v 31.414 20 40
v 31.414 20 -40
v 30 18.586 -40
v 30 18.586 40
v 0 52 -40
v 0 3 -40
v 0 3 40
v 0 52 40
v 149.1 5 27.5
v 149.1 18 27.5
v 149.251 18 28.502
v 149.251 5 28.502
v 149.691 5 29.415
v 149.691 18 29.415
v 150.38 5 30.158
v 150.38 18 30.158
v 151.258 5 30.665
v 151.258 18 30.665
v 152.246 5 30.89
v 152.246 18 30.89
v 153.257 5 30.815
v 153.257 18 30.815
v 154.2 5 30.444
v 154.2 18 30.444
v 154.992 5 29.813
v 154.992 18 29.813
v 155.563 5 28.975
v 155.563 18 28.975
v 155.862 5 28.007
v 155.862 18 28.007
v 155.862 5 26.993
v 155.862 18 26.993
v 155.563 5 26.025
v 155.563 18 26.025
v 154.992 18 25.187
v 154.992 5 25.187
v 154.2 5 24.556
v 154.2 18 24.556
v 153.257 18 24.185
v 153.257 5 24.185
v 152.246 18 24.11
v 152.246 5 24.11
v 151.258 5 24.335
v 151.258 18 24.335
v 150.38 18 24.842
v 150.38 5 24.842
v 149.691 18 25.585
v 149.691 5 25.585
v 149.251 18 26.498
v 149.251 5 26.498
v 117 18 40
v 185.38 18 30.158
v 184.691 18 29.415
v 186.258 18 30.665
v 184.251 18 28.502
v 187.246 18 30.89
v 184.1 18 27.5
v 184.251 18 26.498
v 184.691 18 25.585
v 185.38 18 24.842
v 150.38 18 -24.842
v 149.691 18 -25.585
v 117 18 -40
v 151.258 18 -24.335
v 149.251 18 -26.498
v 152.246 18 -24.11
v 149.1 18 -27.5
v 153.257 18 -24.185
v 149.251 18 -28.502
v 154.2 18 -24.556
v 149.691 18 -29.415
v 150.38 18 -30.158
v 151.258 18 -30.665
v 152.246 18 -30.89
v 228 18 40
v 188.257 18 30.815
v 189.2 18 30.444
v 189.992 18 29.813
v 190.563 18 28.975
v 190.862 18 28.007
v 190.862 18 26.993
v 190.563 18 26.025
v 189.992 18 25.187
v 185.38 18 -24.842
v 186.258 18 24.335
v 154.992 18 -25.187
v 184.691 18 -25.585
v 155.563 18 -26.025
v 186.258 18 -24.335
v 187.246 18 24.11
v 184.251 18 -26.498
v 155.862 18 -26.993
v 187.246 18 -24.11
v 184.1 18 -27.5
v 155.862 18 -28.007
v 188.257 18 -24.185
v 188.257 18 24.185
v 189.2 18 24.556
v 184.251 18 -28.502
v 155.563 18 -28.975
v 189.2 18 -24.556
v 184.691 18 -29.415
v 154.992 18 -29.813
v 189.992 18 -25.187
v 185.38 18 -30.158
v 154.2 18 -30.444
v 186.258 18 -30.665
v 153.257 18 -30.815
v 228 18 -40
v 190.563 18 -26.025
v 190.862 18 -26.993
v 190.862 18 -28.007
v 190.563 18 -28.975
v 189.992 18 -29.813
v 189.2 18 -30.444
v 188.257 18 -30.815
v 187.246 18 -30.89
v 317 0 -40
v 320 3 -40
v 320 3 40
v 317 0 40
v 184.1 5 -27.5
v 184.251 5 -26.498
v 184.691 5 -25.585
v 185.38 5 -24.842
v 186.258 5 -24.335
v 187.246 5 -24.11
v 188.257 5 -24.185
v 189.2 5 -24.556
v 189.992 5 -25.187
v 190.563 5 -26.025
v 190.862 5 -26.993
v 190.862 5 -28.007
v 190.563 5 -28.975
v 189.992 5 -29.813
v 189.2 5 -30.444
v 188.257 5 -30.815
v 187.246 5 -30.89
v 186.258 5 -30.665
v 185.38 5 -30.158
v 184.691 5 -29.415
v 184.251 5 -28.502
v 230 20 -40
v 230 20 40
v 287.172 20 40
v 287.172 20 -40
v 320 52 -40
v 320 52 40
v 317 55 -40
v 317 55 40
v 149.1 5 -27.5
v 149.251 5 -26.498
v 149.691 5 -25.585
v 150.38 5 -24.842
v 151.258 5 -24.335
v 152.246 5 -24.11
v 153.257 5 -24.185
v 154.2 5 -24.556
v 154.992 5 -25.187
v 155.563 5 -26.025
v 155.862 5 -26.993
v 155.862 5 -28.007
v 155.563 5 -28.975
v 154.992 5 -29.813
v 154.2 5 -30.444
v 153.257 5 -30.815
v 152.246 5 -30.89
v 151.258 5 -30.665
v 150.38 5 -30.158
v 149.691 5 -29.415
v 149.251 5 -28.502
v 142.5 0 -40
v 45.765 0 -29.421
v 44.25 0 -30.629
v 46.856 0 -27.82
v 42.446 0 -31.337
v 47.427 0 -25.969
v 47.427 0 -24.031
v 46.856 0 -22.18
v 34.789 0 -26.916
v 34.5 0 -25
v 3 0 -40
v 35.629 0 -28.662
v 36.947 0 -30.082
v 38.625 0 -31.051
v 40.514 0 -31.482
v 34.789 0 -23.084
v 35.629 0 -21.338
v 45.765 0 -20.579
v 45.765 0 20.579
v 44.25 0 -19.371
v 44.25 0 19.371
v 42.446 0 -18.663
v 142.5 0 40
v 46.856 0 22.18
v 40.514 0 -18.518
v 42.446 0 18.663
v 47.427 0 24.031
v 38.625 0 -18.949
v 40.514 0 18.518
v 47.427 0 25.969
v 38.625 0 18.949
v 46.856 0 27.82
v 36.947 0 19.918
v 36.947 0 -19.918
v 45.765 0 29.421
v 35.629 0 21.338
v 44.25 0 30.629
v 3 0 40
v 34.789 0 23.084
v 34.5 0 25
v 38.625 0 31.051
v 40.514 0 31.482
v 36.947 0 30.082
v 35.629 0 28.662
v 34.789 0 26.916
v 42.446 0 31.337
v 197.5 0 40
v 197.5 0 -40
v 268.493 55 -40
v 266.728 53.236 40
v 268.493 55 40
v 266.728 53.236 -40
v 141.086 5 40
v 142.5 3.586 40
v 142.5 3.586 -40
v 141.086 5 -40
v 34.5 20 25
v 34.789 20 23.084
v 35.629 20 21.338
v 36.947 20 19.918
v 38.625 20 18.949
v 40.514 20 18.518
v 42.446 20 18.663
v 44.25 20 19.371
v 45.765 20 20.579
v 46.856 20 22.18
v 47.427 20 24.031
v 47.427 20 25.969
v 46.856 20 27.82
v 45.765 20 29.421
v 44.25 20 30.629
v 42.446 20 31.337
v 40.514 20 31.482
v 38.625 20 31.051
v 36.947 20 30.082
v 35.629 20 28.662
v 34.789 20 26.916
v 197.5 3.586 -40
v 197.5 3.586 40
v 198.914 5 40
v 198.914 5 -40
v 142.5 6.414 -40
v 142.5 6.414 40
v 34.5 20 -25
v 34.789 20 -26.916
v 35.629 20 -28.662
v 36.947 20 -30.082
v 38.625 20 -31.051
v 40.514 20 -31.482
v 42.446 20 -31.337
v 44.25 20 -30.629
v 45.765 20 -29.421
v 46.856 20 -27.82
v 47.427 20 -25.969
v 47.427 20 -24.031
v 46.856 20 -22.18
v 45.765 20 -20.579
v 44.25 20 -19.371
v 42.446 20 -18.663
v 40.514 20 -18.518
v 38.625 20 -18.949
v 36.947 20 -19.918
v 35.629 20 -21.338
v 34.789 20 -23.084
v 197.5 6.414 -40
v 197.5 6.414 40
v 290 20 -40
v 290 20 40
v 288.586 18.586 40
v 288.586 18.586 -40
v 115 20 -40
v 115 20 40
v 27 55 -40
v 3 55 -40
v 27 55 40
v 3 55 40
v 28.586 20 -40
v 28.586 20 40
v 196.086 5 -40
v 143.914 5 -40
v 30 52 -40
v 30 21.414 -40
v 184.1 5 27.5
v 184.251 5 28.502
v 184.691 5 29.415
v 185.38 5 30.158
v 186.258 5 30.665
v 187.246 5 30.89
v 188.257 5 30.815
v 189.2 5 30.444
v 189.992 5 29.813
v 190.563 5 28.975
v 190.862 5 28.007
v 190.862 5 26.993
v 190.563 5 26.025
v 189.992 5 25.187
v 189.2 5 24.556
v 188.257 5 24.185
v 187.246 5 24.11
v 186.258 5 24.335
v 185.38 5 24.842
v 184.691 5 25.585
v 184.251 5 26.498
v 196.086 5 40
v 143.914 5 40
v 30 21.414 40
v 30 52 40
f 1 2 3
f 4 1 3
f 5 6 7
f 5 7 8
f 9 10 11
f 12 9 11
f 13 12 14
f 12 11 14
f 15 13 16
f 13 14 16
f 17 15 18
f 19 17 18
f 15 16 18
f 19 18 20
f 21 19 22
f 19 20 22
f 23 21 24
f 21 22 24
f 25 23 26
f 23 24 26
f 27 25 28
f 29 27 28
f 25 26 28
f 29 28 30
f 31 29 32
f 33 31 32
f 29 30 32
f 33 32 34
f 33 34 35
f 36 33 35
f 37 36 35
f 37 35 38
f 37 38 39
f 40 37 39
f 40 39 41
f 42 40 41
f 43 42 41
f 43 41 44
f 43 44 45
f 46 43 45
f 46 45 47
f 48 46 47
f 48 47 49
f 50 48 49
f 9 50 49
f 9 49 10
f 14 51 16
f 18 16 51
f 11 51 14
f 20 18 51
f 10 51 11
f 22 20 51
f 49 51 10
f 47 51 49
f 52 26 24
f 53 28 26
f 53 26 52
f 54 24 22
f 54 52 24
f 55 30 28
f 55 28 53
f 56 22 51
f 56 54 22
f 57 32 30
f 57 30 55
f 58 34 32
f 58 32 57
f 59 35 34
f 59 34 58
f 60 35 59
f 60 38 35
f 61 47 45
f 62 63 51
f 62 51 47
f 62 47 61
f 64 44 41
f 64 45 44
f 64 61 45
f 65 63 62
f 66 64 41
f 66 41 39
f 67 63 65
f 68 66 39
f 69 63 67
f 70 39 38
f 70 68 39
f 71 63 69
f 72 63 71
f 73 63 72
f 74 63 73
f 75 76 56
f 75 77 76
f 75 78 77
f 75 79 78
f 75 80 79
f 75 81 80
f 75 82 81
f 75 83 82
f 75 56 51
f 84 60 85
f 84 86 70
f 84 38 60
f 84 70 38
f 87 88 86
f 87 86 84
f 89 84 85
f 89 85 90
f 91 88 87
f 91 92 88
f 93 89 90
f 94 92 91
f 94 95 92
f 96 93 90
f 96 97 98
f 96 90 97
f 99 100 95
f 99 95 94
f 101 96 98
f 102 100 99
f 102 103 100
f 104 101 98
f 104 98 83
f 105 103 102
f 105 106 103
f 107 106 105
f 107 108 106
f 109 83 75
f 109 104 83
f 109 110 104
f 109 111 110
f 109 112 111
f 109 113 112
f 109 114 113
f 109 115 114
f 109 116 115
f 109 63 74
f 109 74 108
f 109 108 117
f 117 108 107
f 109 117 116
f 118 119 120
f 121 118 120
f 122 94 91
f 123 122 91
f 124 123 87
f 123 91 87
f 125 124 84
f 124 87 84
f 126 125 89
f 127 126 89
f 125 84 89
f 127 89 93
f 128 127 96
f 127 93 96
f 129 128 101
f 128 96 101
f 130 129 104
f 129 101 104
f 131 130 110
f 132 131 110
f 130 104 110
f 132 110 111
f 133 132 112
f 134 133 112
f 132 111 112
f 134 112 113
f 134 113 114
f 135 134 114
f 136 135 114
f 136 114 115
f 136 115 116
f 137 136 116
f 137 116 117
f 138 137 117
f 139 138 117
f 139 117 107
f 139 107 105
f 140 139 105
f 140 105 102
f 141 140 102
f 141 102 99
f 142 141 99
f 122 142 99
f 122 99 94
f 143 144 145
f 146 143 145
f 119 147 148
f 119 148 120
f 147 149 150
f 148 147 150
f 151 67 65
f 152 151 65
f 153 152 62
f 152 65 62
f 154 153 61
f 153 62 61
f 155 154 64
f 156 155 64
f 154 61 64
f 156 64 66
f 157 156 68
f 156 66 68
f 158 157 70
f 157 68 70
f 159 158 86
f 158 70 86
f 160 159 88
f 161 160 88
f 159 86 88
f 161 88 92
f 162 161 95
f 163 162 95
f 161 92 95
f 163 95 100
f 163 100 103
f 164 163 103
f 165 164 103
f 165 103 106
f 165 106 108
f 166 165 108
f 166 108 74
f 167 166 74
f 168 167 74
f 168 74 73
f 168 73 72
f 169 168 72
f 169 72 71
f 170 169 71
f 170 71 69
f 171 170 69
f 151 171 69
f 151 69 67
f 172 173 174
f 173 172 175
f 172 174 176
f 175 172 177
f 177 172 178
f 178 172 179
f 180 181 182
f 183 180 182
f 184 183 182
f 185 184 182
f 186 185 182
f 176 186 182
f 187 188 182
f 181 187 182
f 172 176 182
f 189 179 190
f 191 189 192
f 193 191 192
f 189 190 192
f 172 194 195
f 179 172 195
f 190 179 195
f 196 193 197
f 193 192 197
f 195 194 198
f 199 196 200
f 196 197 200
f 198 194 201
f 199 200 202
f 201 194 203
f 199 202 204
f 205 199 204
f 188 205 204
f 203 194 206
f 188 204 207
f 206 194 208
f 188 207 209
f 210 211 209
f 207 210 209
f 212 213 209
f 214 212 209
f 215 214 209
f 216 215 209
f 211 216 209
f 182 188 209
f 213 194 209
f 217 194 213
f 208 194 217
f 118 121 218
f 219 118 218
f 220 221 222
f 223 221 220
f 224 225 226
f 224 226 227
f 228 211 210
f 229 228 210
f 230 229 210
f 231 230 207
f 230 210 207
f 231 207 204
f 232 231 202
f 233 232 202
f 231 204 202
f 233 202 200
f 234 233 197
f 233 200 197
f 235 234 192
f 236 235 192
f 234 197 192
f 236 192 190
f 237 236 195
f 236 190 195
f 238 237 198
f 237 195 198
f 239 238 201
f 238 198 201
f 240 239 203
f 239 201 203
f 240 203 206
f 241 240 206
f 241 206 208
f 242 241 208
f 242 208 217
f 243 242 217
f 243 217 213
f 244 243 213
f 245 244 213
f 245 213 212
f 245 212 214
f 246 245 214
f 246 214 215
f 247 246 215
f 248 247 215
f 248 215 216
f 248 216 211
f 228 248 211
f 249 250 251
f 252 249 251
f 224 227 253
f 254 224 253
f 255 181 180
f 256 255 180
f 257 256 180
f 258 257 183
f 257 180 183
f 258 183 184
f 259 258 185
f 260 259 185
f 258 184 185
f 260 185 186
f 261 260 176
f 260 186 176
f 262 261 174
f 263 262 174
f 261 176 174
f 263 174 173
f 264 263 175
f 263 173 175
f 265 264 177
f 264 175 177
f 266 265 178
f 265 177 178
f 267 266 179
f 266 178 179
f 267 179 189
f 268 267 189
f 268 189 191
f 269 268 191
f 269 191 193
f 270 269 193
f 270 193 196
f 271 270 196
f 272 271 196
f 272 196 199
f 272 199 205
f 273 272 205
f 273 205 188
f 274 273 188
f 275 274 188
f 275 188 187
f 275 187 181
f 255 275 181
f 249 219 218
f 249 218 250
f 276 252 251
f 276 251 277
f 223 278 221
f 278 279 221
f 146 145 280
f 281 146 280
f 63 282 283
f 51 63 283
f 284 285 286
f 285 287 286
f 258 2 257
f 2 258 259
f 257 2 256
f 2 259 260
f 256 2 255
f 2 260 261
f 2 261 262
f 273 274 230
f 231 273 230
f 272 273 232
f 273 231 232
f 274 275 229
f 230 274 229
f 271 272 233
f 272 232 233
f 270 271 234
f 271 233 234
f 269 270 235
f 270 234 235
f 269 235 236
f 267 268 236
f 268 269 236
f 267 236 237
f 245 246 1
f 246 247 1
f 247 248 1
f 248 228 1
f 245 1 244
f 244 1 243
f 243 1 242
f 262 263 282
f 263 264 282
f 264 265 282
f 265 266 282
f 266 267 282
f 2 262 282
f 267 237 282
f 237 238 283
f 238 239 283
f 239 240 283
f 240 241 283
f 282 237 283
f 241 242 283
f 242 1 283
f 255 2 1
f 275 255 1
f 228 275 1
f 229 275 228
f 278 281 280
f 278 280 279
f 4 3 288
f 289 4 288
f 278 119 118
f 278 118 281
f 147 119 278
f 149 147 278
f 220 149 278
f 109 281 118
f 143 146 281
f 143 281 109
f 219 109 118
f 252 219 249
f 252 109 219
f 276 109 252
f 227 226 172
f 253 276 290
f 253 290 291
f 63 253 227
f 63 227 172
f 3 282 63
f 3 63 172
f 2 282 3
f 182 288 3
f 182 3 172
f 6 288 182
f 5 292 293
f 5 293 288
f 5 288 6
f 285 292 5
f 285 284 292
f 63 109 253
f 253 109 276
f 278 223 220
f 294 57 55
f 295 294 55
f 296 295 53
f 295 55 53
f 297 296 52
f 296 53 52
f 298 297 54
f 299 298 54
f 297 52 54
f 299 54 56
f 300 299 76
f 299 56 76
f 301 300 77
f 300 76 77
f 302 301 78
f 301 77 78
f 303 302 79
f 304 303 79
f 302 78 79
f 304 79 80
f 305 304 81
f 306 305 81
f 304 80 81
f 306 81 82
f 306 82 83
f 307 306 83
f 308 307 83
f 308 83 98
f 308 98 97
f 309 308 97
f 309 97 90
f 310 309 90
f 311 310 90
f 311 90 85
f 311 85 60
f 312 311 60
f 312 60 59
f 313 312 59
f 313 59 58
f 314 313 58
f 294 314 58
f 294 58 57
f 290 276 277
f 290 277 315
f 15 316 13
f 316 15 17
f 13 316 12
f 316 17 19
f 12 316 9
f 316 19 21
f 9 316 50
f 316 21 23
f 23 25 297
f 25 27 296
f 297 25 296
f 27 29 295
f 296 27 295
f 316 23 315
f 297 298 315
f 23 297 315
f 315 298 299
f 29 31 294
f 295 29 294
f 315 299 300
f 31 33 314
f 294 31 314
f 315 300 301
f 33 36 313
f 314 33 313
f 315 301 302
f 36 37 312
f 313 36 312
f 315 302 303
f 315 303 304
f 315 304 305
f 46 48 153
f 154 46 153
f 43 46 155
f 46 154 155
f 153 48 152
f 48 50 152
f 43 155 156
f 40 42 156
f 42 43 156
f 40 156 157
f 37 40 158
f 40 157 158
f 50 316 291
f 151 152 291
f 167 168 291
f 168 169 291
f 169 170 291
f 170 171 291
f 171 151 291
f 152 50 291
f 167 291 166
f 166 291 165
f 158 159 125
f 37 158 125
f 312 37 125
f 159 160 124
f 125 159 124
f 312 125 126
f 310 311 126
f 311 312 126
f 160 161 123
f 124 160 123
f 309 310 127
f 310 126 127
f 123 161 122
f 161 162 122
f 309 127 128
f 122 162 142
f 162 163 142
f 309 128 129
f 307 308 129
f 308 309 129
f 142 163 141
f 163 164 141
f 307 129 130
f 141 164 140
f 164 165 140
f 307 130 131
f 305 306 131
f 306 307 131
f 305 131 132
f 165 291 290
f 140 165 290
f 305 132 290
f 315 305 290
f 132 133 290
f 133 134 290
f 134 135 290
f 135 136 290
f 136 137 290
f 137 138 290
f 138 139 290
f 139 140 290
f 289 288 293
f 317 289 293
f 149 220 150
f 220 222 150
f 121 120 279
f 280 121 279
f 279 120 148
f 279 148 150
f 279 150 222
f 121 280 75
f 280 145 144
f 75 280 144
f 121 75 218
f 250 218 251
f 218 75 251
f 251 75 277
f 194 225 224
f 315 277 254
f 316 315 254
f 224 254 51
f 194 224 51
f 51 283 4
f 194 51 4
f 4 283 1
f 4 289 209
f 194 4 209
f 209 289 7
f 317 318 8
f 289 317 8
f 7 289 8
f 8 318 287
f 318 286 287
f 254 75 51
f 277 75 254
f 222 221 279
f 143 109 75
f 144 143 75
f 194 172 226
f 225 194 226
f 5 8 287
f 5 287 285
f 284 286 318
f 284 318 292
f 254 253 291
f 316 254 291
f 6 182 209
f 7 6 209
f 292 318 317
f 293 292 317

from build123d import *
from OCP.BRepFilletAPI import BRepFilletAPI_MakeChamfer

# Parameters (mm, degrees)
EXTRUDE_1_DEPTH          = 40
CUT_EXTRUDE_1_DEPTH      = 335.402452144
CUT_EXTRUDE_1_DEPTH_BACK = 80
SKETCH_2_W               = 115
SKETCH_2_H               = 2
CHAMFER_1_SIZE           = 2
CUT_EXTRUDE_1_2_DEPTH    = 80
CUT_EXTRUDE_2_DEPTH      = 335.402452144
CUT_EXTRUDE_2_DEPTH_BACK = 80
SKETCH_4_W               = 55
SKETCH_4_H               = 5
CUT_EXTRUDE_2_2_DEPTH    = 80
HOLE_WIZARD_M8_1_D       = 6.8
HOLE_WIZARD_1_D          = 13
CHAMFER_2_SIZE           = 3
CHAMFER_2_SIZE2          = 2.154045129


with BuildPart() as part:
    # 草图1 → 凸台-拉伸1 (new, symmetric)
    with BuildSketch(Plane.XY):
        Polygon((0, 0), (0, 55), (30, 55), (30, 20), (290, 20), (265.492736163, 55), (320, 55), (320, 0), align=None)
    extrude(amount=EXTRUDE_1_DEPTH, both=True)

    # 草图2 → Cut-Extrude 1 (cut, two sides: drawn at the far end of the back side and taken through both)
    with BuildSketch(Plane.XY.offset(40).offset(-CUT_EXTRUDE_1_DEPTH_BACK)):
        with Locations((172.5, 19)):
            Rectangle(SKETCH_2_W, SKETCH_2_H)
    extrude(amount=CUT_EXTRUDE_1_DEPTH + CUT_EXTRUDE_1_DEPTH_BACK, mode=Mode.SUBTRACT)

    # 倒角1
    chamfer_1_edges = [part.edges().sort_by_distance(p)[0] for p in [
        (230, 18, 0),
        (115, 18, 0),
    ]]
    chamfer(chamfer_1_edges, length=CHAMFER_1_SIZE - 0.0001)  # a hair under: the kernel refuses the full size

    # 草图3 → Cut-Extrude 1 2 (cut)
    with BuildSketch(Plane.XY.offset(40)):
        Polygon((287.171572875, 20), (288.585786438, 18.585786438), (290, 20), (288.585786438, 21.414213562), align=None)
        Polygon((28.585786438, 20), (30, 21.414213562), (31.414213562, 20), (30, 18.585786438), align=None)
    extrude(amount=-CUT_EXTRUDE_1_2_DEPTH, mode=Mode.SUBTRACT)

    # 草图4 → Cut-Extrude 2 (cut, two sides: drawn at the far end of the back side and taken through both)
    with BuildSketch(Plane.XY.offset(40).offset(-CUT_EXTRUDE_2_DEPTH_BACK)):
        with Locations((170, 2.5)):
            Rectangle(SKETCH_4_W, SKETCH_4_H)
    extrude(amount=CUT_EXTRUDE_2_DEPTH + CUT_EXTRUDE_2_DEPTH_BACK, mode=Mode.SUBTRACT)

    # 草图5 → Cut-Extrude 2 2 (cut)
    with BuildSketch(Plane.XY.offset(40)):
        Polygon((198.914213562, 5), (197.5, 6.414213562), (196.085786438, 5), (197.5, 3.585786438), align=None)
    cut_extrude_2_2 = extrude(amount=-CUT_EXTRUDE_2_2_DEPTH, mode=Mode.SUBTRACT)

    # 镜向1: Cut-Extrude 2 2 across plane
    add(cut_extrude_2_2.mirror(Plane(origin=(170, 0, 0), x_dir=(0, 0, 1), z_dir=(1, 0, 0))), mode=Mode.SUBTRACT)

    # M8 螺纹孔1 (through all)
    with Locations(Plane.XZ):
        with Locations((152.5, 27.5), (187.5, 27.5), (187.5, -27.5), (152.5, -27.5)):
            Hole(HOLE_WIZARD_M8_1_D / 2)

    # 孔1 (through all)
    with Locations(Plane(origin=(0, 20, 0), x_dir=(1, 0, 0), z_dir=(0, 1, 0))):
        with Locations((41, 25), (41, -25)):
            Hole(HOLE_WIZARD_1_D / 2)

    # 倒角2: one chamfer whose edges measure the first distance from different faces: ONE call of the kernel's chamfer builder (chamfer() names one face for all edges)
    chamfer_2_edges_1 = [part.edges().sort_by_distance(p)[0] for p in [
        (0, 0, 0),
        (0, 55, 0),
        (30, 55, 0),
        (320, 55, 0),
        (320, 0, 0),
    ]]
    chamfer_2_edges_2 = [part.edges().sort_by_distance(p)[0] for p in [
        (265.492736163, 55, 0),
    ]]
    chamfer_2_side_2 = [part.faces().sort_by_distance(p)[0] for p in [
        (292.746368081, 55, 0),
    ]]
    chamfer_2 = BRepFilletAPI_MakeChamfer(part.part.solid().wrapped)
    for e in chamfer_2_edges_1:
        chamfer_2.Add(CHAMFER_2_SIZE, e.wrapped)
    for e in chamfer_2_edges_2:
        chamfer_2.Add(CHAMFER_2_SIZE, CHAMFER_2_SIZE2, e.wrapped, chamfer_2_side_2[0].wrapped)  # the first distance lies on this face
    add(Compound.cast(chamfer_2.Shape()), mode=Mode.REPLACE)


solid = part.part
